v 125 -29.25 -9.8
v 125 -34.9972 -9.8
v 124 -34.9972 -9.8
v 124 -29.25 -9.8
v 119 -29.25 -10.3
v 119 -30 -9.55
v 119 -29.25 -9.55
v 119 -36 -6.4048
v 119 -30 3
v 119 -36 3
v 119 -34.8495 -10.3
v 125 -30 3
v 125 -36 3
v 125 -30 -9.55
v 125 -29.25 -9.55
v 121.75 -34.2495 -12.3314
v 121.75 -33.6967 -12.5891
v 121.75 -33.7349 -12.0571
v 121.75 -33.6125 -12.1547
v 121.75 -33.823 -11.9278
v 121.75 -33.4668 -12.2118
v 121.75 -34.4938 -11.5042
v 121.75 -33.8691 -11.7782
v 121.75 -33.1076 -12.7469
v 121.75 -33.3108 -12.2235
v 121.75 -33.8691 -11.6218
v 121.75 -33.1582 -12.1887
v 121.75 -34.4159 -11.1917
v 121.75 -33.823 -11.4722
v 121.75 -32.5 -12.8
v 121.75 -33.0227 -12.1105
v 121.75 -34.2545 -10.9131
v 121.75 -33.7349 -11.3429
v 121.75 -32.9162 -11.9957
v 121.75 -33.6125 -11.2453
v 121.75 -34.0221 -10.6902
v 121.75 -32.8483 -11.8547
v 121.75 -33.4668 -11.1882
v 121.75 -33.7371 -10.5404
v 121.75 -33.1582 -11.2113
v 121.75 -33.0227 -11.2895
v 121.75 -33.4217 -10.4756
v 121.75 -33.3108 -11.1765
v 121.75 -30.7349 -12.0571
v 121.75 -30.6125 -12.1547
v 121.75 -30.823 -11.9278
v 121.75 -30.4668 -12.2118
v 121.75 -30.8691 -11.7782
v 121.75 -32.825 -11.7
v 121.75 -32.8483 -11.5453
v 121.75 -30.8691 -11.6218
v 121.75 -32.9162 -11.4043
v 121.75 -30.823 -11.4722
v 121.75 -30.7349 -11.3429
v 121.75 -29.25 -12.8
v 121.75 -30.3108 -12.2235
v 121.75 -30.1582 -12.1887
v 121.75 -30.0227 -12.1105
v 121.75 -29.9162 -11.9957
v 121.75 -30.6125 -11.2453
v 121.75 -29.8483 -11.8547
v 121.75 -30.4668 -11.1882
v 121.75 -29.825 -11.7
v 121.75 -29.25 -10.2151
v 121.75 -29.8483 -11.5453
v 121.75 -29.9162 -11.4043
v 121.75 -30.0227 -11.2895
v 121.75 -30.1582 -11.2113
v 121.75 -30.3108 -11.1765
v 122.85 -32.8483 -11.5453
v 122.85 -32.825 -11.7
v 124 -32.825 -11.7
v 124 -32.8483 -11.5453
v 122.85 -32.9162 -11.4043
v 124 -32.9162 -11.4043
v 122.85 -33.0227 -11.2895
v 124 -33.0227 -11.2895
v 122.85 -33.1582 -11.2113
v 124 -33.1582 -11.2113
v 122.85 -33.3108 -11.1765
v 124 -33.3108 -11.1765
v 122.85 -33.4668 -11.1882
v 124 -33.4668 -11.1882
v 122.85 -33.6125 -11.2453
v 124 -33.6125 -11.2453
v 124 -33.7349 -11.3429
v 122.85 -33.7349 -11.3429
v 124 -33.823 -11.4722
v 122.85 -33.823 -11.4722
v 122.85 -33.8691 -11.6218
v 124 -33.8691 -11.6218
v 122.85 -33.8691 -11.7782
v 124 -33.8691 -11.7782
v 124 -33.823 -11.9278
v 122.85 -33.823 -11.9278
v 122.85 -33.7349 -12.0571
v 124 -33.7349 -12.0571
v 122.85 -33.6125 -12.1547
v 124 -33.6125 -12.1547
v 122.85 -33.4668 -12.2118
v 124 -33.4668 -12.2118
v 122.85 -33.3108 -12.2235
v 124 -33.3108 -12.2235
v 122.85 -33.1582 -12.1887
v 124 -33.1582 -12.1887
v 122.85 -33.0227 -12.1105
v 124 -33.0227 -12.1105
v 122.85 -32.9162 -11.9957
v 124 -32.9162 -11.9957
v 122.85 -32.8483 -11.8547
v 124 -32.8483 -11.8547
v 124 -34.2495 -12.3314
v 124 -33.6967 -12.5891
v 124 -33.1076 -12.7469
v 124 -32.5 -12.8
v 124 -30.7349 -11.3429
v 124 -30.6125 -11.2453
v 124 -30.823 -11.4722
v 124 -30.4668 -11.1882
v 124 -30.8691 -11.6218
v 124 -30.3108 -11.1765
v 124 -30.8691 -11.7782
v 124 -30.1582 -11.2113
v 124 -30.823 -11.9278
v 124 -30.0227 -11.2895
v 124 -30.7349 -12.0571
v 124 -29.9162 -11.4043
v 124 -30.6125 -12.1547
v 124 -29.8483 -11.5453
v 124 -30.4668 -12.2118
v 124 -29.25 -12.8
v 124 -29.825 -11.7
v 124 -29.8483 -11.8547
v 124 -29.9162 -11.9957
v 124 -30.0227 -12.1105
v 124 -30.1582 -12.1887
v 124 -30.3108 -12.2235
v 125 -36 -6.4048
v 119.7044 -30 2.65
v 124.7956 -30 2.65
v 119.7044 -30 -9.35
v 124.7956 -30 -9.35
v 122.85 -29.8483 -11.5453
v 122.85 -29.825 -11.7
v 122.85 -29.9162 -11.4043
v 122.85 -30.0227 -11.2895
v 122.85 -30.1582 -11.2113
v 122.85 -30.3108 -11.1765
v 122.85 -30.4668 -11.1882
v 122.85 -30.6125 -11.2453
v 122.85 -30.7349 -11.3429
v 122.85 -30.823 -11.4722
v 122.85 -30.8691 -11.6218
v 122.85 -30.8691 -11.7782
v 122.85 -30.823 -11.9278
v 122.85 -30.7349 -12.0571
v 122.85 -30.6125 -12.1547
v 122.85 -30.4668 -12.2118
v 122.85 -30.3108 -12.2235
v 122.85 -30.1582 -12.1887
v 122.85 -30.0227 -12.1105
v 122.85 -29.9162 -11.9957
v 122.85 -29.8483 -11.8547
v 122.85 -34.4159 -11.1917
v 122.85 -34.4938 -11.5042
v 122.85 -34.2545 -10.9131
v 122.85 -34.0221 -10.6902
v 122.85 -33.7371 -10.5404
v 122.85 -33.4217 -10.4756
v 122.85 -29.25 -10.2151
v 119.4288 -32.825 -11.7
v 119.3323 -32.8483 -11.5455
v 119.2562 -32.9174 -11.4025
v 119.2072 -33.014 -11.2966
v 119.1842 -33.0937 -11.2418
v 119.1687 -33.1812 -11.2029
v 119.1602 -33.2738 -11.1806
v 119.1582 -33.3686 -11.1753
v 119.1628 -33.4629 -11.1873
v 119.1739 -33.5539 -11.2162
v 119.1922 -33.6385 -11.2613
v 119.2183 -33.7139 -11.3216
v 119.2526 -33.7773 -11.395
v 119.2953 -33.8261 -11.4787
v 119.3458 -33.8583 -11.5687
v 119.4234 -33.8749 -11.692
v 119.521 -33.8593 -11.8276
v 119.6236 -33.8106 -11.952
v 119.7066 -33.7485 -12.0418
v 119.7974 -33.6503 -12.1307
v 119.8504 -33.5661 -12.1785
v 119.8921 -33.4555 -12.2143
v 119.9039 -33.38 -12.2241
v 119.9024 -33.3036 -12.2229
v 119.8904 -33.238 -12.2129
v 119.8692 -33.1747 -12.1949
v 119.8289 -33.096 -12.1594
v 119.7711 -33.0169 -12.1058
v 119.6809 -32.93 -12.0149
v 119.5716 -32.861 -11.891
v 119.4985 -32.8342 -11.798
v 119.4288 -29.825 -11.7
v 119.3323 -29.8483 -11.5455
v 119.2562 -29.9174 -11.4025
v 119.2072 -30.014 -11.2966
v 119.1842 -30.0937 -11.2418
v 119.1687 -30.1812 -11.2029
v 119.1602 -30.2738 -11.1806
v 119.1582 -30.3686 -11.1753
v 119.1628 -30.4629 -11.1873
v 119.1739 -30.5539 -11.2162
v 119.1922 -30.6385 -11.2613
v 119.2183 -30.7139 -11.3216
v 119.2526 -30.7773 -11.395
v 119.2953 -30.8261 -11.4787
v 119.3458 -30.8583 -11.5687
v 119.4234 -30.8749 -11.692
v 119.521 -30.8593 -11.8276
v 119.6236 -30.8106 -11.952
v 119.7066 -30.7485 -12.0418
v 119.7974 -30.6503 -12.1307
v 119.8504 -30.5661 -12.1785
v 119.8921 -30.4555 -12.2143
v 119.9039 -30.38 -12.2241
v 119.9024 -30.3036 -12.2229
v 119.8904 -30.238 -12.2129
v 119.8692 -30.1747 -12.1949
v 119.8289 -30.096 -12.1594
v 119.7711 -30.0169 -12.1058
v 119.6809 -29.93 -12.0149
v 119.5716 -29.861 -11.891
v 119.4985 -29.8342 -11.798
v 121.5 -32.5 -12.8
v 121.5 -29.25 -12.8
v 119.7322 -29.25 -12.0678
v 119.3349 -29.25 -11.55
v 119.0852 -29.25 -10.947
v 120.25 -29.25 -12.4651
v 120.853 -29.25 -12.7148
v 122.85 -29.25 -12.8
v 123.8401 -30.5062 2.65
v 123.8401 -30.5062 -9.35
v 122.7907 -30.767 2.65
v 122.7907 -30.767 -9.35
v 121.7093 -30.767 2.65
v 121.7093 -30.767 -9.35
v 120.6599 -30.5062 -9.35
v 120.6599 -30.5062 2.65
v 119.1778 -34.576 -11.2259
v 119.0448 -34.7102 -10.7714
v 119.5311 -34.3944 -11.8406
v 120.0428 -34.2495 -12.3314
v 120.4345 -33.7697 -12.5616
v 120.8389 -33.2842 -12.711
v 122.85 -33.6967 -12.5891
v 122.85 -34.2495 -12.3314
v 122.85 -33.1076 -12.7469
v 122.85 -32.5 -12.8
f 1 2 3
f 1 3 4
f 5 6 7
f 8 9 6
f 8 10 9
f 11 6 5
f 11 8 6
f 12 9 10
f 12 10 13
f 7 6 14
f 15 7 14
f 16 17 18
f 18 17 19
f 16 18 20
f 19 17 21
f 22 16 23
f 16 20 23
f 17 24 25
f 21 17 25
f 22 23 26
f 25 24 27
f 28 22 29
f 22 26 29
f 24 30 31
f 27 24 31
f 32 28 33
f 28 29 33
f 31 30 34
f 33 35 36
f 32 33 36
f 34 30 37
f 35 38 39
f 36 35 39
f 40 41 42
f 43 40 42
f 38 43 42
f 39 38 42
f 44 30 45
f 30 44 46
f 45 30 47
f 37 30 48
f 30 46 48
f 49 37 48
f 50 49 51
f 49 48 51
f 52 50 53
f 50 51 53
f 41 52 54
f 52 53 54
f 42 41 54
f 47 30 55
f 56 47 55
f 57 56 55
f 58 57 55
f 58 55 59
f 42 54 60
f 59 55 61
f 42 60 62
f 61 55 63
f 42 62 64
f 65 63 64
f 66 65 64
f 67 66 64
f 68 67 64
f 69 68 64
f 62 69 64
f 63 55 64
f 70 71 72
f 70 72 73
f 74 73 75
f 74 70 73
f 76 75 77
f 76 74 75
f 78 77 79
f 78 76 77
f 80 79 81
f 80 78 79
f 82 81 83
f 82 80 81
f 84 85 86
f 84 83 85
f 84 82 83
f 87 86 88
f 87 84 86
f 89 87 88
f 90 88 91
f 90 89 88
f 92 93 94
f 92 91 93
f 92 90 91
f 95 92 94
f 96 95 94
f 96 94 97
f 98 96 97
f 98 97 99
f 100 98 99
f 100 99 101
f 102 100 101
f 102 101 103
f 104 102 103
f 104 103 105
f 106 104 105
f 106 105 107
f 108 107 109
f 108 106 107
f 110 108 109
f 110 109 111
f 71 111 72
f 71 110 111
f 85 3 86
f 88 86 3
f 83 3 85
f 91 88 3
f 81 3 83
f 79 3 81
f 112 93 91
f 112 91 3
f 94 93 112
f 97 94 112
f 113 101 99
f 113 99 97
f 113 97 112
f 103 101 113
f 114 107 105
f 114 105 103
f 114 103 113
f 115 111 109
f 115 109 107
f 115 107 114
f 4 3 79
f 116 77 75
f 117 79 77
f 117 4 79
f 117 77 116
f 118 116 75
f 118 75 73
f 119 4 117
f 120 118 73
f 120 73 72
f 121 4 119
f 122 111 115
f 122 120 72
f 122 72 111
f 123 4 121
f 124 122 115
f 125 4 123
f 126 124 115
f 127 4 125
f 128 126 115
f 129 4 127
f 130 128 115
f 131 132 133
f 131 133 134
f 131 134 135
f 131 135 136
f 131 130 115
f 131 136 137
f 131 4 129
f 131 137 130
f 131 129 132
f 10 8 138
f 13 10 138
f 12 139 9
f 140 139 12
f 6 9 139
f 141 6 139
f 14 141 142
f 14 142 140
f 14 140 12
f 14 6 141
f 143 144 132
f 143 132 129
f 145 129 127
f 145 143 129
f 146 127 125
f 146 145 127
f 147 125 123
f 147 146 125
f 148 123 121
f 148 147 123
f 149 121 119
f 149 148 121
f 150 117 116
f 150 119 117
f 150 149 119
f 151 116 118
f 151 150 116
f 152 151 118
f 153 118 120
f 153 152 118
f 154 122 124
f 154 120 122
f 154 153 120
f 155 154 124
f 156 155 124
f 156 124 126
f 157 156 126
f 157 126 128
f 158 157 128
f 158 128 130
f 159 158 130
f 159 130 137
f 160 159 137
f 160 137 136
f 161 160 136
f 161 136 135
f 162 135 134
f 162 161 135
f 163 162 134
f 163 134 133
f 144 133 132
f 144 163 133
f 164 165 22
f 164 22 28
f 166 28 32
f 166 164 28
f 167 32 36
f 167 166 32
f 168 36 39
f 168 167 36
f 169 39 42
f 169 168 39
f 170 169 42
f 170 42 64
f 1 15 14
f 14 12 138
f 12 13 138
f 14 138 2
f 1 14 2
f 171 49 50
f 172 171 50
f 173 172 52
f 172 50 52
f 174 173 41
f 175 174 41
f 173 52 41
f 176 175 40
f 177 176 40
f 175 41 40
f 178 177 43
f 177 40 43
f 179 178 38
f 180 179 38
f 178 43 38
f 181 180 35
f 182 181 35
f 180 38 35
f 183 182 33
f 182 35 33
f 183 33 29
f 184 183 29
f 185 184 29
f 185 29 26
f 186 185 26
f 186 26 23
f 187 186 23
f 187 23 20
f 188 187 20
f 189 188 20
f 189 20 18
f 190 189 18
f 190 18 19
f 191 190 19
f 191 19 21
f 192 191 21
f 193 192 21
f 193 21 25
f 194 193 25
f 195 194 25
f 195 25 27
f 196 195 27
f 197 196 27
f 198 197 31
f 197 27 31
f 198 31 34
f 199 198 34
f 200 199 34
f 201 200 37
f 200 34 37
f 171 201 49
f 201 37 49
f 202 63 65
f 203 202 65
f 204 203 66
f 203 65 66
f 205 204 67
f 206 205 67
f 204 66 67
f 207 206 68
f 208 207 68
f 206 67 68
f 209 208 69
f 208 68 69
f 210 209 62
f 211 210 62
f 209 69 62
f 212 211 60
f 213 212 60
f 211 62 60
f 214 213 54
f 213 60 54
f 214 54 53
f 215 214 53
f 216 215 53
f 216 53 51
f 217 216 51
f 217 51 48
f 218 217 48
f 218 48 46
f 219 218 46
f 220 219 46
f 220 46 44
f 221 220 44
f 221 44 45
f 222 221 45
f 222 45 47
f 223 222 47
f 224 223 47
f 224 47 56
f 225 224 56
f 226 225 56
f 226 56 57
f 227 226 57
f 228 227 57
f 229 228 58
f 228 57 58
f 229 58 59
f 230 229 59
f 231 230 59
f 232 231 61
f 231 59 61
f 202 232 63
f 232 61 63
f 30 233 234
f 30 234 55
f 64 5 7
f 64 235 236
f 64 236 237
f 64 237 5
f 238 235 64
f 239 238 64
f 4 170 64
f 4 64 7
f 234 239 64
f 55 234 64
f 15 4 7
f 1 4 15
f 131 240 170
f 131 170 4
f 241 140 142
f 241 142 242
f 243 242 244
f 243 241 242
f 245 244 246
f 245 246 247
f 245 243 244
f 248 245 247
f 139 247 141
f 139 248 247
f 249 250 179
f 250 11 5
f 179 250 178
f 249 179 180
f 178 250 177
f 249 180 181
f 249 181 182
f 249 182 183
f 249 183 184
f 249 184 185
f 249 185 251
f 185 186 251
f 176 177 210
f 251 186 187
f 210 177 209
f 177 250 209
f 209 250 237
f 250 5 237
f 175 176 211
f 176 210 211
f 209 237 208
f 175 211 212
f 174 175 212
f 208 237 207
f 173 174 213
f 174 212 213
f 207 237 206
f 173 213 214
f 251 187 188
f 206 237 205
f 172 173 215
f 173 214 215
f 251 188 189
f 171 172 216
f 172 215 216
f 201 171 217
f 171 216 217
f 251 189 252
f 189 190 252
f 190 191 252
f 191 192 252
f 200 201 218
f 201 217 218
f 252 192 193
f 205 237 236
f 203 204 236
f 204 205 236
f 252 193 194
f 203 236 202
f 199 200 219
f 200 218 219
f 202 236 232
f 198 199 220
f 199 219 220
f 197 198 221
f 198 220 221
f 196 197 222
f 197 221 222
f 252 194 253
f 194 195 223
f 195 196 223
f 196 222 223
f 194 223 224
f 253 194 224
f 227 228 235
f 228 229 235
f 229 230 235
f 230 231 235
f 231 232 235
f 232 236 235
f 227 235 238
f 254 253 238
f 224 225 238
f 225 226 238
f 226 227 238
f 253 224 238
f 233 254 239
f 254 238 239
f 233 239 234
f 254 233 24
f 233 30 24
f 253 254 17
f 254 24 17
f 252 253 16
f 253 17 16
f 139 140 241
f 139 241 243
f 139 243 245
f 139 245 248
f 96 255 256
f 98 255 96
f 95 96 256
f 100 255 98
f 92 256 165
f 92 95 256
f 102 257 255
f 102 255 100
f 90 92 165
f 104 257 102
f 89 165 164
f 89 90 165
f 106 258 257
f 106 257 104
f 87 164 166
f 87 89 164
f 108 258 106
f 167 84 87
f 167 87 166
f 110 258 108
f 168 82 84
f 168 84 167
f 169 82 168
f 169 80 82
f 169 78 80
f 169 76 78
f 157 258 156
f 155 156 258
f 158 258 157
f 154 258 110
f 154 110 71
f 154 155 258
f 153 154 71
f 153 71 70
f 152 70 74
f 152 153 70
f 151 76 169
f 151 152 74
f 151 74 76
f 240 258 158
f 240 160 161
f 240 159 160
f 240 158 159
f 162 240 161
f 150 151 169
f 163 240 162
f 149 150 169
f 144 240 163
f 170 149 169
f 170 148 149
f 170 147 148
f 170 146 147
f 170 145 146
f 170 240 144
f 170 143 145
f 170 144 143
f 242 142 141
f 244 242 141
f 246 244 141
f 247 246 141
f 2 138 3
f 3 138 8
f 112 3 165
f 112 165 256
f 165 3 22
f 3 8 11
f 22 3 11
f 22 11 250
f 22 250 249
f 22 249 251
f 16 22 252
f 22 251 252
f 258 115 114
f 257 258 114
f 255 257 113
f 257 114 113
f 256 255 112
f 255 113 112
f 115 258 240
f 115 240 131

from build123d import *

# Parameters (mm, degrees)
BOSS_EXTRUDE1_DEPTH            = 3
BOSS_EXTRUDE1_DEPTH_BACK       = 12.8
SKETCH1_W                      = 6
SKETCH1_H                      = 6
SKETCH10_W                     = 6
SKETCH10_H                     = 3.25
BOSS_EXTRUDE2_DEPTH            = 0.75
CUT_EXTRUDE2_DEPTH             = 0.1
CUT_EXTRUDE2_DEPTH_BACK        = 1
CUT_EXTRUDE3_DEPTH             = 5.5
CUT_EXTRUDE3_DEPTH_BACK        = 6.5
SKETCH5_R                      = 4.45
CUT_EXTRUDE4_REACH             = 40.346
SKETCH7_R                      = 0.525
CUT_EXTRUDE4_DIRECTION_2_REACH = 40.346
SKETCH8_W                      = 3
SKETCH8_H                      = 6.75
CUT_EXTRUDE5_DEPTH             = 1
FILLET1_R                      = 3.5
FILLET1_R_2                    = 2.5
CUT_EXTRUDE7_DEPTH             = 39.676090947


with BuildPart() as part:
    # Sketch1 → Boss-Extrude1 (new, two sides: drawn at the far end of the back side and taken through both)
    with BuildSketch(Plane.XY.offset(-BOSS_EXTRUDE1_DEPTH_BACK)):
        with Locations((122, -33)):
            Rectangle(SKETCH1_W, SKETCH1_H)
    extrude(amount=BOSS_EXTRUDE1_DEPTH + BOSS_EXTRUDE1_DEPTH_BACK)

    # Sketch10 → Boss-Extrude2 (add)
    with BuildSketch(Plane(origin=(0, -30, 0), x_dir=(1, 0, 0), z_dir=(0, 1, 0))):
        with Locations((122, 11.175)):
            Rectangle(SKETCH10_W, SKETCH10_H)
    extrude(amount=BOSS_EXTRUDE2_DEPTH)

    # Sketch4 → Cut-Extrude2 (cut, two sides: drawn at the far end of the back side and taken through both)
    with BuildSketch(Plane.ZY.offset(-121.85).offset(-CUT_EXTRUDE2_DEPTH_BACK)):
        with BuildLine():
            Line((-11.776969868, -34.5), (-11.623346252, -34.5))
            ThreePointArc((-11.623346252, -34.5), (-10.835914556, -34.188123693), (-10.475580755, -33.421654477))
            Line((-10.475580755, -33.421654477), (-10.040343544, -26.45))
            Line((-10.040343544, -26.45), (-13.359649062, -26.45))
            Line((-13.359649062, -26.45), (-12.924738676, -33.421601422))
            ThreePointArc((-12.924738676, -33.421601422), (-12.564420934, -34.188105493), (-11.776969868, -34.5))
        make_face()
    extrude(amount=CUT_EXTRUDE2_DEPTH + CUT_EXTRUDE2_DEPTH_BACK, mode=Mode.SUBTRACT)

    # Sketch5 → Cut-Extrude3 (cut, two sides: drawn at the far end of the back side and taken through both)
    with BuildSketch(Plane(origin=(0, 0, -3.85), x_dir=(-1, 0, 0), z_dir=(0, 0, -1)).offset(-CUT_EXTRUDE3_DEPTH_BACK)):
        with Locations((-122.25, -26.35)):
            Circle(SKETCH5_R)
    extrude(amount=CUT_EXTRUDE3_DEPTH + CUT_EXTRUDE3_DEPTH_BACK, mode=Mode.SUBTRACT)

    # Cut-Extrude4: up to this face of the body (flat: up to its plane)
    cut_extrude4_end = Plane(part.part.faces().sort_by_distance((119, -32.915397223, -5.057298496))[0])
    # Sketch7 → Cut-Extrude4 (cut, up to the picked face)
    with BuildSketch(Plane(origin=(121.75, 0, 0), x_dir=(0, 0, -1), z_dir=(1, 0, 0)), mode=Mode.PRIVATE) as cut_extrude4_sk1:
        with Locations(Location((11.7, -33.35, 0), (0, 0, 90))):
            Circle(SKETCH7_R)
    cut_extrude4_tool1 = split(extrude(cut_extrude4_sk1.sketch, amount=-CUT_EXTRUDE4_REACH, mode=Mode.PRIVATE), bisect_by=cut_extrude4_end, keep=Keep.BOTH, mode=Mode.PRIVATE)
    # Sketch7 → Cut-Extrude4 (cut, up to the picked face)
    with BuildSketch(Plane(origin=(121.75, 0, 0), x_dir=(0, 0, -1), z_dir=(1, 0, 0)), mode=Mode.PRIVATE) as cut_extrude4_sk2:
        with Locations(Location((11.7, -30.35, 0), (0, 0, 90))):
            Circle(SKETCH7_R)
    cut_extrude4_tool2 = split(extrude(cut_extrude4_sk2.sketch, amount=-CUT_EXTRUDE4_REACH, mode=Mode.PRIVATE), bisect_by=cut_extrude4_end, keep=Keep.BOTH, mode=Mode.PRIVATE)
    add(cut_extrude4_tool1.solids().sort_by(Axis((121.75, -33.35, -11.7), (-1, 0, 0)))[0], mode=Mode.SUBTRACT)
    add(cut_extrude4_tool2.solids().sort_by(Axis((121.75, -30.35, -11.7), (-1, 0, 0)))[0], mode=Mode.SUBTRACT)

    # Cut-Extrude4 direction 2: up to this face of the body (flat: up to its plane)
    cut_extrude4_direction_2_end = Plane(part.part.faces().sort_by_distance((125, -32.915397223, -5.057298496))[0])
    # Sketch7 → Cut-Extrude4 direction 2 (cut, up to the picked face)
    with BuildSketch(Plane(origin=(121.75, 0, 0), x_dir=(0, 0, -1), z_dir=(1, 0, 0)), mode=Mode.PRIVATE) as cut_extrude4_direction_2_sk1:
        with Locations(Location((11.7, -33.35, 0), (0, 0, 90))):
            Circle(SKETCH7_R)
    cut_extrude4_direction_2_tool1 = split(extrude(cut_extrude4_direction_2_sk1.sketch, amount=CUT_EXTRUDE4_DIRECTION_2_REACH, mode=Mode.PRIVATE), bisect_by=cut_extrude4_direction_2_end, keep=Keep.BOTH, mode=Mode.PRIVATE)
    # Sketch7 → Cut-Extrude4 direction 2 (cut, up to the picked face)
    with BuildSketch(Plane(origin=(121.75, 0, 0), x_dir=(0, 0, -1), z_dir=(1, 0, 0)), mode=Mode.PRIVATE) as cut_extrude4_direction_2_sk2:
        with Locations(Location((11.7, -30.35, 0), (0, 0, 90))):
            Circle(SKETCH7_R)
    cut_extrude4_direction_2_tool2 = split(extrude(cut_extrude4_direction_2_sk2.sketch, amount=CUT_EXTRUDE4_DIRECTION_2_REACH, mode=Mode.PRIVATE), bisect_by=cut_extrude4_direction_2_end, keep=Keep.BOTH, mode=Mode.PRIVATE)
    add(cut_extrude4_direction_2_tool1.solids().sort_by(Axis((121.75, -33.35, -11.7), (1, 0, 0)))[0], mode=Mode.SUBTRACT)
    add(cut_extrude4_direction_2_tool2.solids().sort_by(Axis((121.75, -30.35, -11.7), (1, 0, 0)))[0], mode=Mode.SUBTRACT)

    # Sketch8 → Cut-Extrude5 (cut)
    with BuildSketch(Plane(origin=(125, 0, 0), x_dir=(0, 0, -1), z_dir=(1, 0, 0))):
        with Locations((11.3, -32.625)):
            Rectangle(SKETCH8_W, SKETCH8_H)
    extrude(amount=-CUT_EXTRUDE5_DEPTH, mode=Mode.SUBTRACT)

    # Fillet1
    # the kernel refuses this fillet: 3.5, 2.5 mm, written as the material it takes off along each edge
    with BuildSketch(Plane(origin=(132.75, -36, -12.8), x_dir=(0, 0, 1), z_dir=(-1, 0, 0))) as fillet1_piece_1:
        with BuildLine():
            CenterArc((FILLET1_R, FILLET1_R), FILLET1_R, 180, 90)
            Line((0, FILLET1_R), (0, 0))
            Line((0, 0), (FILLET1_R, 0))
        make_face()
    extrude(amount=22.5, mode=Mode.SUBTRACT)
    # the kernel refuses this fillet: 3.5, 2.5 mm, written as the material it takes off along each edge
    with BuildSketch(Plane(origin=(119, -23, -12.8), x_dir=(0, 0, 1), z_dir=(0, -1, 0))) as fillet1_2_piece_1:
        with BuildLine():
            CenterArc((FILLET1_R_2, -FILLET1_R_2), FILLET1_R_2, 90, 90)
            Line((0, -FILLET1_R_2), (0, 0))
            Line((0, 0), (FILLET1_R_2, 0))
        make_face()
    extrude(amount=15.75, mode=Mode.SUBTRACT)

    # Sketch12 → Cut-Extrude7 (cut, through all)
    with BuildSketch(Plane.ZY.offset(-119)):
        Polygon((-6.404787377, -36), (-12.404787377, -34.227808088), (-12.404787377, -36), align=None)
    extrude(amount=-CUT_EXTRUDE7_DEPTH, mode=Mode.SUBTRACT)


solid = part.part
